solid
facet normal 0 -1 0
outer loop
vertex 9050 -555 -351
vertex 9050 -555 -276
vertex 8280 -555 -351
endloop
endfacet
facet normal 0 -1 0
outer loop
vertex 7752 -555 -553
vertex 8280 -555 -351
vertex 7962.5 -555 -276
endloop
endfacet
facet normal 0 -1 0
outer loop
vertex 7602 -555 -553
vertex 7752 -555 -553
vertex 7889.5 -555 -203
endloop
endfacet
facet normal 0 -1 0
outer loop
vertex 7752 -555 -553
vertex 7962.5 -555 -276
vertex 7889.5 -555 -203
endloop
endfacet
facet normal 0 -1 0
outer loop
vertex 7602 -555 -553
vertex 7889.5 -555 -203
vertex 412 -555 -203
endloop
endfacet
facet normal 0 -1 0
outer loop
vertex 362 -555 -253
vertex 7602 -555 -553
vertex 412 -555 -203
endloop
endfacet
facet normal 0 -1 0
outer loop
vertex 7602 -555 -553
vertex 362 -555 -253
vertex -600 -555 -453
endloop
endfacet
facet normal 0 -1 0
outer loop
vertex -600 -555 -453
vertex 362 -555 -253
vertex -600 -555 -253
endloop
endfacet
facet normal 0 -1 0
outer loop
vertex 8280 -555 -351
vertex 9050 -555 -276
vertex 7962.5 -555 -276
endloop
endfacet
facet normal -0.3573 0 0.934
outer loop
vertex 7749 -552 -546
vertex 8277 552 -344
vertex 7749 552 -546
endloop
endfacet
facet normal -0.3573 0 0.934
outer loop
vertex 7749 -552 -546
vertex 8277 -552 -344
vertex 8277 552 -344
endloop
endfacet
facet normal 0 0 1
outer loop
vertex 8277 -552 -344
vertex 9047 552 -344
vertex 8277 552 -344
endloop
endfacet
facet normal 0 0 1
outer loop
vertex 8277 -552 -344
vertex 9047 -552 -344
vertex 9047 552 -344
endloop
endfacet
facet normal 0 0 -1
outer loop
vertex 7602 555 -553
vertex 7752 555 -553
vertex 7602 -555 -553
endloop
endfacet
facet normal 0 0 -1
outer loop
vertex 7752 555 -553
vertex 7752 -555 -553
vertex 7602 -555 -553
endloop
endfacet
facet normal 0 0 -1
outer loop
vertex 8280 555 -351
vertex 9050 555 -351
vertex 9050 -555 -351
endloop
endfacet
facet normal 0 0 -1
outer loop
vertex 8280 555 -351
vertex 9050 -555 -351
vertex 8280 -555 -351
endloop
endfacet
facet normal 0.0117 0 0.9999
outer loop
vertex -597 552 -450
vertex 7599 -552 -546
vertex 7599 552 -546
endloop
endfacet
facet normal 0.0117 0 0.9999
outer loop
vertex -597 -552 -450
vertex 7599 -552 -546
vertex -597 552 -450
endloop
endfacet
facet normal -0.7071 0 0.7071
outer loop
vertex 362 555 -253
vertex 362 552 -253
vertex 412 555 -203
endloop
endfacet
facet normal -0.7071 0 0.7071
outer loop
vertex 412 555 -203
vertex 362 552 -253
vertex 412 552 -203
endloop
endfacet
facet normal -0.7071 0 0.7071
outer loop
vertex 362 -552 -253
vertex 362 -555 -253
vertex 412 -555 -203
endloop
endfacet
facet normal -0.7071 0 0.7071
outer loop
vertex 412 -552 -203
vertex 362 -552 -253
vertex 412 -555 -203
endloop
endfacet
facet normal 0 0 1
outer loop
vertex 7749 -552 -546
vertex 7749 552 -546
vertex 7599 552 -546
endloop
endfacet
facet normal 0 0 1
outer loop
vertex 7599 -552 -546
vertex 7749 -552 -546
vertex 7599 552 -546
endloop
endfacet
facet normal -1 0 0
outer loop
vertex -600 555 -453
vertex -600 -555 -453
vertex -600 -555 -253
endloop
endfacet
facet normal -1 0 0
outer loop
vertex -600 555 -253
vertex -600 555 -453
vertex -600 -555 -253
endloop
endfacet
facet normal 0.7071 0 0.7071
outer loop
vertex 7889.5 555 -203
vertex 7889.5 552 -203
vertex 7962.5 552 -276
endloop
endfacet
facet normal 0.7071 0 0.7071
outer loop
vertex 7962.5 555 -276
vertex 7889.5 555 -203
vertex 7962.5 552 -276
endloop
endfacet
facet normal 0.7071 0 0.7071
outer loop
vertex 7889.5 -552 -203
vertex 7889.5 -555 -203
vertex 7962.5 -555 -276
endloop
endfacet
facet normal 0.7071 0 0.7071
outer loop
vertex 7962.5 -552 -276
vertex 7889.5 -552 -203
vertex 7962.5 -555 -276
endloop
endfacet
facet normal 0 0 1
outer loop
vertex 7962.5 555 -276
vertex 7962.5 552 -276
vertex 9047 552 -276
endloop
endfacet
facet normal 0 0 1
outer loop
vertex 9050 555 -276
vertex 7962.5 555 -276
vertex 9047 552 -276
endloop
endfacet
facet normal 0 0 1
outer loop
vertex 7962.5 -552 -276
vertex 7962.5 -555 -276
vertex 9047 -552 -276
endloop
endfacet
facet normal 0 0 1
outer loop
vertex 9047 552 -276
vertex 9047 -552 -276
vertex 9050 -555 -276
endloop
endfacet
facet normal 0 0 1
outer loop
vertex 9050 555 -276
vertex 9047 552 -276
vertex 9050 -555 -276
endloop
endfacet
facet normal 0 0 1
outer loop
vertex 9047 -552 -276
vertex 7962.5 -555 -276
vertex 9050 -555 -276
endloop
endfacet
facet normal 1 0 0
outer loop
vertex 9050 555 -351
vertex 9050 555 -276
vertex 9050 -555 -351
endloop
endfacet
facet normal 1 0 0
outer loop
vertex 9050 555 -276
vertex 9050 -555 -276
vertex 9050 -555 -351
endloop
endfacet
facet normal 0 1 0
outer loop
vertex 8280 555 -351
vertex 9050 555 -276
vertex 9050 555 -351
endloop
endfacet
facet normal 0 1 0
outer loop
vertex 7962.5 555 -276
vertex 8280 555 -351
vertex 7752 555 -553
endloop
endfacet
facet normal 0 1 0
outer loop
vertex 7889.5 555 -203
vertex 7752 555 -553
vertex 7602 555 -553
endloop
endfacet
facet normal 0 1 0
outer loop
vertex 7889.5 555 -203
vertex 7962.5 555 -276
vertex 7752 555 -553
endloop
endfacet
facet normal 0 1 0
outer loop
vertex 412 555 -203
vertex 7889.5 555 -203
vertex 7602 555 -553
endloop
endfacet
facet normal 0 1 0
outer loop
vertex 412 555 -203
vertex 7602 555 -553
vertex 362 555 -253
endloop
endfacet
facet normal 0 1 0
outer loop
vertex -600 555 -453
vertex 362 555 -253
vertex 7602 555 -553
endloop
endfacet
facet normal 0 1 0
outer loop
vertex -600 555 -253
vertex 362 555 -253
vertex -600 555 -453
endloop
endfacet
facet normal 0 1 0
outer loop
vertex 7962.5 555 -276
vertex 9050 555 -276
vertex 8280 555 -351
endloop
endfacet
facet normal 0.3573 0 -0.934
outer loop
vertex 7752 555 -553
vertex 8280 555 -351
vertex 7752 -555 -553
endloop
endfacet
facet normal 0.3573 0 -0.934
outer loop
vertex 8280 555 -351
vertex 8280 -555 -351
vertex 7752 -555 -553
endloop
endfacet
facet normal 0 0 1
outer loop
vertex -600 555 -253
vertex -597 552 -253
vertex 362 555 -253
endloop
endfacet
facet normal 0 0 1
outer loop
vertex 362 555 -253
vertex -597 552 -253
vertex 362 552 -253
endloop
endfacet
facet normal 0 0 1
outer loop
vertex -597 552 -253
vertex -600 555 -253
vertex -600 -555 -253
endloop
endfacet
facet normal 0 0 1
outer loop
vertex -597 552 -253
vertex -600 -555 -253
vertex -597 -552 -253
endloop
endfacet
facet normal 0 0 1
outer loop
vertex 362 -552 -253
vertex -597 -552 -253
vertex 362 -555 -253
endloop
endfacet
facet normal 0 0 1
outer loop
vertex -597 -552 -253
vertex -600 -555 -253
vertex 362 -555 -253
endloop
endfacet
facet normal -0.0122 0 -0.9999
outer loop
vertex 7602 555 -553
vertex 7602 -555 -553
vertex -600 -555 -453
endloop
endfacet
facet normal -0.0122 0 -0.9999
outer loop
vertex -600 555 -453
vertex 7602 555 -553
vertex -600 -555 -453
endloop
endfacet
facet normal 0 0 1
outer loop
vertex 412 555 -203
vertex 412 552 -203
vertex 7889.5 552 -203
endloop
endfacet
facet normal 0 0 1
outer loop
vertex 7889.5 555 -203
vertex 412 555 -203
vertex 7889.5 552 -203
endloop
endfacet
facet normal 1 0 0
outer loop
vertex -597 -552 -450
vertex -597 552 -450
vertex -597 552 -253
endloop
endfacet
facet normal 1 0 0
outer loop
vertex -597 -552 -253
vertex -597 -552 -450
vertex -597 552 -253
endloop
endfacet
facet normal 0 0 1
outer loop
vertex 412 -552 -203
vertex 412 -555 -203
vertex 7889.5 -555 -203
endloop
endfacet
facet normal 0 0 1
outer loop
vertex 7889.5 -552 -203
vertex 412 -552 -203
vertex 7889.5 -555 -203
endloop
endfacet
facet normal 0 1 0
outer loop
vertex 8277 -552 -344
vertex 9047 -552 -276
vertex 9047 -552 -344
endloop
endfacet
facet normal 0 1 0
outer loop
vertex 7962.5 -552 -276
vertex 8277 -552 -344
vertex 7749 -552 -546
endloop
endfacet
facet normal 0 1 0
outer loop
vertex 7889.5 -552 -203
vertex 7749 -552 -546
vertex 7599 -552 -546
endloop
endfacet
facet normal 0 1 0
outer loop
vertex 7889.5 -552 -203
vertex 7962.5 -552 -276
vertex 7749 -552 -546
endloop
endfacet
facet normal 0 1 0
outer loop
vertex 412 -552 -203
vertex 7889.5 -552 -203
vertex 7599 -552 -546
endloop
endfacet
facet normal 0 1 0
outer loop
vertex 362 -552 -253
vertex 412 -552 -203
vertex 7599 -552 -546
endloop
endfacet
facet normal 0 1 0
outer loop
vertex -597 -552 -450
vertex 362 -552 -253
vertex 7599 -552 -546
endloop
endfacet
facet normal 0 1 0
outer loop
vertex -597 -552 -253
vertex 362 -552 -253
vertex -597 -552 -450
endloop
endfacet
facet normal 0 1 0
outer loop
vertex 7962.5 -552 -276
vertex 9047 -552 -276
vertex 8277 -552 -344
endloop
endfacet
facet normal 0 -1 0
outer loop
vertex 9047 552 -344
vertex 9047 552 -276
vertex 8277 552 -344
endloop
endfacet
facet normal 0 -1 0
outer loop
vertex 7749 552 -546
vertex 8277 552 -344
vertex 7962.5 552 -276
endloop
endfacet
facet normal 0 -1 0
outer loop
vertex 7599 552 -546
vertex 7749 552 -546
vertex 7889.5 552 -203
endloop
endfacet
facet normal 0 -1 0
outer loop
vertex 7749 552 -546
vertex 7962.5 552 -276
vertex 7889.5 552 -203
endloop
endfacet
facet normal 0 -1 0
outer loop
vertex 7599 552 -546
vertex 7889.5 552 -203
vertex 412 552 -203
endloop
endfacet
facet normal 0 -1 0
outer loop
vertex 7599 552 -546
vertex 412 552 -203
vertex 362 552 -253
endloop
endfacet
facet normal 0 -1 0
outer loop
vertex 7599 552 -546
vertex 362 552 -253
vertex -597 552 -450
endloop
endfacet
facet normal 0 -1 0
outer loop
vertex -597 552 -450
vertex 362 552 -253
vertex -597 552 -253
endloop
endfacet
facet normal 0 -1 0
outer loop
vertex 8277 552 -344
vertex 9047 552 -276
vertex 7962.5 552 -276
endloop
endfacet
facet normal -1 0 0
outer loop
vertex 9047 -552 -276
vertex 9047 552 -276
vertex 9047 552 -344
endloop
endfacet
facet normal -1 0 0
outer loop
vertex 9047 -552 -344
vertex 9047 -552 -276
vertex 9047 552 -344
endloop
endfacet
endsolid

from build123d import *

# Parameters (mm, degrees)
EXTRUDE031_DEPTH = 552
EXTRUDE015_DEPTH = 555


with BuildPart() as extrude031:
    # Sketch032 → Extrude031 (new body, symmetric)
    with BuildSketch(Plane.XZ):
        Polygon((-597, -253), (362, -253), (440, -175), (7862.5, -175), (7959.5, -272), (9047, -272), (9047, -347), (8277, -347), (7749, -549), (7599, -549), (-597, -453), align=None)
    extrude(amount=EXTRUDE031_DEPTH, both=True)


with BuildPart() as extrude031_1:
    # Extrude031 placement: moved
    add(extrude031.part.moved(Location((0, 0, 3))))


with BuildPart() as cut:
    # Sketch023 → Extrude015 (new body, symmetric)
    with BuildSketch(Plane.XZ):
        Polygon((-600, -253), (362, -253), (412, -203), (7889.5, -203), (7962.5, -276), (9050, -276), (9050, -351), (8280, -351), (7752, -553), (7602, -553), (-600, -453), align=None)
    extrude(amount=EXTRUDE015_DEPTH, both=True)

    # Cut: cut Extrude031
    add(extrude031_1.part, mode=Mode.SUBTRACT)


solid = cut.part
